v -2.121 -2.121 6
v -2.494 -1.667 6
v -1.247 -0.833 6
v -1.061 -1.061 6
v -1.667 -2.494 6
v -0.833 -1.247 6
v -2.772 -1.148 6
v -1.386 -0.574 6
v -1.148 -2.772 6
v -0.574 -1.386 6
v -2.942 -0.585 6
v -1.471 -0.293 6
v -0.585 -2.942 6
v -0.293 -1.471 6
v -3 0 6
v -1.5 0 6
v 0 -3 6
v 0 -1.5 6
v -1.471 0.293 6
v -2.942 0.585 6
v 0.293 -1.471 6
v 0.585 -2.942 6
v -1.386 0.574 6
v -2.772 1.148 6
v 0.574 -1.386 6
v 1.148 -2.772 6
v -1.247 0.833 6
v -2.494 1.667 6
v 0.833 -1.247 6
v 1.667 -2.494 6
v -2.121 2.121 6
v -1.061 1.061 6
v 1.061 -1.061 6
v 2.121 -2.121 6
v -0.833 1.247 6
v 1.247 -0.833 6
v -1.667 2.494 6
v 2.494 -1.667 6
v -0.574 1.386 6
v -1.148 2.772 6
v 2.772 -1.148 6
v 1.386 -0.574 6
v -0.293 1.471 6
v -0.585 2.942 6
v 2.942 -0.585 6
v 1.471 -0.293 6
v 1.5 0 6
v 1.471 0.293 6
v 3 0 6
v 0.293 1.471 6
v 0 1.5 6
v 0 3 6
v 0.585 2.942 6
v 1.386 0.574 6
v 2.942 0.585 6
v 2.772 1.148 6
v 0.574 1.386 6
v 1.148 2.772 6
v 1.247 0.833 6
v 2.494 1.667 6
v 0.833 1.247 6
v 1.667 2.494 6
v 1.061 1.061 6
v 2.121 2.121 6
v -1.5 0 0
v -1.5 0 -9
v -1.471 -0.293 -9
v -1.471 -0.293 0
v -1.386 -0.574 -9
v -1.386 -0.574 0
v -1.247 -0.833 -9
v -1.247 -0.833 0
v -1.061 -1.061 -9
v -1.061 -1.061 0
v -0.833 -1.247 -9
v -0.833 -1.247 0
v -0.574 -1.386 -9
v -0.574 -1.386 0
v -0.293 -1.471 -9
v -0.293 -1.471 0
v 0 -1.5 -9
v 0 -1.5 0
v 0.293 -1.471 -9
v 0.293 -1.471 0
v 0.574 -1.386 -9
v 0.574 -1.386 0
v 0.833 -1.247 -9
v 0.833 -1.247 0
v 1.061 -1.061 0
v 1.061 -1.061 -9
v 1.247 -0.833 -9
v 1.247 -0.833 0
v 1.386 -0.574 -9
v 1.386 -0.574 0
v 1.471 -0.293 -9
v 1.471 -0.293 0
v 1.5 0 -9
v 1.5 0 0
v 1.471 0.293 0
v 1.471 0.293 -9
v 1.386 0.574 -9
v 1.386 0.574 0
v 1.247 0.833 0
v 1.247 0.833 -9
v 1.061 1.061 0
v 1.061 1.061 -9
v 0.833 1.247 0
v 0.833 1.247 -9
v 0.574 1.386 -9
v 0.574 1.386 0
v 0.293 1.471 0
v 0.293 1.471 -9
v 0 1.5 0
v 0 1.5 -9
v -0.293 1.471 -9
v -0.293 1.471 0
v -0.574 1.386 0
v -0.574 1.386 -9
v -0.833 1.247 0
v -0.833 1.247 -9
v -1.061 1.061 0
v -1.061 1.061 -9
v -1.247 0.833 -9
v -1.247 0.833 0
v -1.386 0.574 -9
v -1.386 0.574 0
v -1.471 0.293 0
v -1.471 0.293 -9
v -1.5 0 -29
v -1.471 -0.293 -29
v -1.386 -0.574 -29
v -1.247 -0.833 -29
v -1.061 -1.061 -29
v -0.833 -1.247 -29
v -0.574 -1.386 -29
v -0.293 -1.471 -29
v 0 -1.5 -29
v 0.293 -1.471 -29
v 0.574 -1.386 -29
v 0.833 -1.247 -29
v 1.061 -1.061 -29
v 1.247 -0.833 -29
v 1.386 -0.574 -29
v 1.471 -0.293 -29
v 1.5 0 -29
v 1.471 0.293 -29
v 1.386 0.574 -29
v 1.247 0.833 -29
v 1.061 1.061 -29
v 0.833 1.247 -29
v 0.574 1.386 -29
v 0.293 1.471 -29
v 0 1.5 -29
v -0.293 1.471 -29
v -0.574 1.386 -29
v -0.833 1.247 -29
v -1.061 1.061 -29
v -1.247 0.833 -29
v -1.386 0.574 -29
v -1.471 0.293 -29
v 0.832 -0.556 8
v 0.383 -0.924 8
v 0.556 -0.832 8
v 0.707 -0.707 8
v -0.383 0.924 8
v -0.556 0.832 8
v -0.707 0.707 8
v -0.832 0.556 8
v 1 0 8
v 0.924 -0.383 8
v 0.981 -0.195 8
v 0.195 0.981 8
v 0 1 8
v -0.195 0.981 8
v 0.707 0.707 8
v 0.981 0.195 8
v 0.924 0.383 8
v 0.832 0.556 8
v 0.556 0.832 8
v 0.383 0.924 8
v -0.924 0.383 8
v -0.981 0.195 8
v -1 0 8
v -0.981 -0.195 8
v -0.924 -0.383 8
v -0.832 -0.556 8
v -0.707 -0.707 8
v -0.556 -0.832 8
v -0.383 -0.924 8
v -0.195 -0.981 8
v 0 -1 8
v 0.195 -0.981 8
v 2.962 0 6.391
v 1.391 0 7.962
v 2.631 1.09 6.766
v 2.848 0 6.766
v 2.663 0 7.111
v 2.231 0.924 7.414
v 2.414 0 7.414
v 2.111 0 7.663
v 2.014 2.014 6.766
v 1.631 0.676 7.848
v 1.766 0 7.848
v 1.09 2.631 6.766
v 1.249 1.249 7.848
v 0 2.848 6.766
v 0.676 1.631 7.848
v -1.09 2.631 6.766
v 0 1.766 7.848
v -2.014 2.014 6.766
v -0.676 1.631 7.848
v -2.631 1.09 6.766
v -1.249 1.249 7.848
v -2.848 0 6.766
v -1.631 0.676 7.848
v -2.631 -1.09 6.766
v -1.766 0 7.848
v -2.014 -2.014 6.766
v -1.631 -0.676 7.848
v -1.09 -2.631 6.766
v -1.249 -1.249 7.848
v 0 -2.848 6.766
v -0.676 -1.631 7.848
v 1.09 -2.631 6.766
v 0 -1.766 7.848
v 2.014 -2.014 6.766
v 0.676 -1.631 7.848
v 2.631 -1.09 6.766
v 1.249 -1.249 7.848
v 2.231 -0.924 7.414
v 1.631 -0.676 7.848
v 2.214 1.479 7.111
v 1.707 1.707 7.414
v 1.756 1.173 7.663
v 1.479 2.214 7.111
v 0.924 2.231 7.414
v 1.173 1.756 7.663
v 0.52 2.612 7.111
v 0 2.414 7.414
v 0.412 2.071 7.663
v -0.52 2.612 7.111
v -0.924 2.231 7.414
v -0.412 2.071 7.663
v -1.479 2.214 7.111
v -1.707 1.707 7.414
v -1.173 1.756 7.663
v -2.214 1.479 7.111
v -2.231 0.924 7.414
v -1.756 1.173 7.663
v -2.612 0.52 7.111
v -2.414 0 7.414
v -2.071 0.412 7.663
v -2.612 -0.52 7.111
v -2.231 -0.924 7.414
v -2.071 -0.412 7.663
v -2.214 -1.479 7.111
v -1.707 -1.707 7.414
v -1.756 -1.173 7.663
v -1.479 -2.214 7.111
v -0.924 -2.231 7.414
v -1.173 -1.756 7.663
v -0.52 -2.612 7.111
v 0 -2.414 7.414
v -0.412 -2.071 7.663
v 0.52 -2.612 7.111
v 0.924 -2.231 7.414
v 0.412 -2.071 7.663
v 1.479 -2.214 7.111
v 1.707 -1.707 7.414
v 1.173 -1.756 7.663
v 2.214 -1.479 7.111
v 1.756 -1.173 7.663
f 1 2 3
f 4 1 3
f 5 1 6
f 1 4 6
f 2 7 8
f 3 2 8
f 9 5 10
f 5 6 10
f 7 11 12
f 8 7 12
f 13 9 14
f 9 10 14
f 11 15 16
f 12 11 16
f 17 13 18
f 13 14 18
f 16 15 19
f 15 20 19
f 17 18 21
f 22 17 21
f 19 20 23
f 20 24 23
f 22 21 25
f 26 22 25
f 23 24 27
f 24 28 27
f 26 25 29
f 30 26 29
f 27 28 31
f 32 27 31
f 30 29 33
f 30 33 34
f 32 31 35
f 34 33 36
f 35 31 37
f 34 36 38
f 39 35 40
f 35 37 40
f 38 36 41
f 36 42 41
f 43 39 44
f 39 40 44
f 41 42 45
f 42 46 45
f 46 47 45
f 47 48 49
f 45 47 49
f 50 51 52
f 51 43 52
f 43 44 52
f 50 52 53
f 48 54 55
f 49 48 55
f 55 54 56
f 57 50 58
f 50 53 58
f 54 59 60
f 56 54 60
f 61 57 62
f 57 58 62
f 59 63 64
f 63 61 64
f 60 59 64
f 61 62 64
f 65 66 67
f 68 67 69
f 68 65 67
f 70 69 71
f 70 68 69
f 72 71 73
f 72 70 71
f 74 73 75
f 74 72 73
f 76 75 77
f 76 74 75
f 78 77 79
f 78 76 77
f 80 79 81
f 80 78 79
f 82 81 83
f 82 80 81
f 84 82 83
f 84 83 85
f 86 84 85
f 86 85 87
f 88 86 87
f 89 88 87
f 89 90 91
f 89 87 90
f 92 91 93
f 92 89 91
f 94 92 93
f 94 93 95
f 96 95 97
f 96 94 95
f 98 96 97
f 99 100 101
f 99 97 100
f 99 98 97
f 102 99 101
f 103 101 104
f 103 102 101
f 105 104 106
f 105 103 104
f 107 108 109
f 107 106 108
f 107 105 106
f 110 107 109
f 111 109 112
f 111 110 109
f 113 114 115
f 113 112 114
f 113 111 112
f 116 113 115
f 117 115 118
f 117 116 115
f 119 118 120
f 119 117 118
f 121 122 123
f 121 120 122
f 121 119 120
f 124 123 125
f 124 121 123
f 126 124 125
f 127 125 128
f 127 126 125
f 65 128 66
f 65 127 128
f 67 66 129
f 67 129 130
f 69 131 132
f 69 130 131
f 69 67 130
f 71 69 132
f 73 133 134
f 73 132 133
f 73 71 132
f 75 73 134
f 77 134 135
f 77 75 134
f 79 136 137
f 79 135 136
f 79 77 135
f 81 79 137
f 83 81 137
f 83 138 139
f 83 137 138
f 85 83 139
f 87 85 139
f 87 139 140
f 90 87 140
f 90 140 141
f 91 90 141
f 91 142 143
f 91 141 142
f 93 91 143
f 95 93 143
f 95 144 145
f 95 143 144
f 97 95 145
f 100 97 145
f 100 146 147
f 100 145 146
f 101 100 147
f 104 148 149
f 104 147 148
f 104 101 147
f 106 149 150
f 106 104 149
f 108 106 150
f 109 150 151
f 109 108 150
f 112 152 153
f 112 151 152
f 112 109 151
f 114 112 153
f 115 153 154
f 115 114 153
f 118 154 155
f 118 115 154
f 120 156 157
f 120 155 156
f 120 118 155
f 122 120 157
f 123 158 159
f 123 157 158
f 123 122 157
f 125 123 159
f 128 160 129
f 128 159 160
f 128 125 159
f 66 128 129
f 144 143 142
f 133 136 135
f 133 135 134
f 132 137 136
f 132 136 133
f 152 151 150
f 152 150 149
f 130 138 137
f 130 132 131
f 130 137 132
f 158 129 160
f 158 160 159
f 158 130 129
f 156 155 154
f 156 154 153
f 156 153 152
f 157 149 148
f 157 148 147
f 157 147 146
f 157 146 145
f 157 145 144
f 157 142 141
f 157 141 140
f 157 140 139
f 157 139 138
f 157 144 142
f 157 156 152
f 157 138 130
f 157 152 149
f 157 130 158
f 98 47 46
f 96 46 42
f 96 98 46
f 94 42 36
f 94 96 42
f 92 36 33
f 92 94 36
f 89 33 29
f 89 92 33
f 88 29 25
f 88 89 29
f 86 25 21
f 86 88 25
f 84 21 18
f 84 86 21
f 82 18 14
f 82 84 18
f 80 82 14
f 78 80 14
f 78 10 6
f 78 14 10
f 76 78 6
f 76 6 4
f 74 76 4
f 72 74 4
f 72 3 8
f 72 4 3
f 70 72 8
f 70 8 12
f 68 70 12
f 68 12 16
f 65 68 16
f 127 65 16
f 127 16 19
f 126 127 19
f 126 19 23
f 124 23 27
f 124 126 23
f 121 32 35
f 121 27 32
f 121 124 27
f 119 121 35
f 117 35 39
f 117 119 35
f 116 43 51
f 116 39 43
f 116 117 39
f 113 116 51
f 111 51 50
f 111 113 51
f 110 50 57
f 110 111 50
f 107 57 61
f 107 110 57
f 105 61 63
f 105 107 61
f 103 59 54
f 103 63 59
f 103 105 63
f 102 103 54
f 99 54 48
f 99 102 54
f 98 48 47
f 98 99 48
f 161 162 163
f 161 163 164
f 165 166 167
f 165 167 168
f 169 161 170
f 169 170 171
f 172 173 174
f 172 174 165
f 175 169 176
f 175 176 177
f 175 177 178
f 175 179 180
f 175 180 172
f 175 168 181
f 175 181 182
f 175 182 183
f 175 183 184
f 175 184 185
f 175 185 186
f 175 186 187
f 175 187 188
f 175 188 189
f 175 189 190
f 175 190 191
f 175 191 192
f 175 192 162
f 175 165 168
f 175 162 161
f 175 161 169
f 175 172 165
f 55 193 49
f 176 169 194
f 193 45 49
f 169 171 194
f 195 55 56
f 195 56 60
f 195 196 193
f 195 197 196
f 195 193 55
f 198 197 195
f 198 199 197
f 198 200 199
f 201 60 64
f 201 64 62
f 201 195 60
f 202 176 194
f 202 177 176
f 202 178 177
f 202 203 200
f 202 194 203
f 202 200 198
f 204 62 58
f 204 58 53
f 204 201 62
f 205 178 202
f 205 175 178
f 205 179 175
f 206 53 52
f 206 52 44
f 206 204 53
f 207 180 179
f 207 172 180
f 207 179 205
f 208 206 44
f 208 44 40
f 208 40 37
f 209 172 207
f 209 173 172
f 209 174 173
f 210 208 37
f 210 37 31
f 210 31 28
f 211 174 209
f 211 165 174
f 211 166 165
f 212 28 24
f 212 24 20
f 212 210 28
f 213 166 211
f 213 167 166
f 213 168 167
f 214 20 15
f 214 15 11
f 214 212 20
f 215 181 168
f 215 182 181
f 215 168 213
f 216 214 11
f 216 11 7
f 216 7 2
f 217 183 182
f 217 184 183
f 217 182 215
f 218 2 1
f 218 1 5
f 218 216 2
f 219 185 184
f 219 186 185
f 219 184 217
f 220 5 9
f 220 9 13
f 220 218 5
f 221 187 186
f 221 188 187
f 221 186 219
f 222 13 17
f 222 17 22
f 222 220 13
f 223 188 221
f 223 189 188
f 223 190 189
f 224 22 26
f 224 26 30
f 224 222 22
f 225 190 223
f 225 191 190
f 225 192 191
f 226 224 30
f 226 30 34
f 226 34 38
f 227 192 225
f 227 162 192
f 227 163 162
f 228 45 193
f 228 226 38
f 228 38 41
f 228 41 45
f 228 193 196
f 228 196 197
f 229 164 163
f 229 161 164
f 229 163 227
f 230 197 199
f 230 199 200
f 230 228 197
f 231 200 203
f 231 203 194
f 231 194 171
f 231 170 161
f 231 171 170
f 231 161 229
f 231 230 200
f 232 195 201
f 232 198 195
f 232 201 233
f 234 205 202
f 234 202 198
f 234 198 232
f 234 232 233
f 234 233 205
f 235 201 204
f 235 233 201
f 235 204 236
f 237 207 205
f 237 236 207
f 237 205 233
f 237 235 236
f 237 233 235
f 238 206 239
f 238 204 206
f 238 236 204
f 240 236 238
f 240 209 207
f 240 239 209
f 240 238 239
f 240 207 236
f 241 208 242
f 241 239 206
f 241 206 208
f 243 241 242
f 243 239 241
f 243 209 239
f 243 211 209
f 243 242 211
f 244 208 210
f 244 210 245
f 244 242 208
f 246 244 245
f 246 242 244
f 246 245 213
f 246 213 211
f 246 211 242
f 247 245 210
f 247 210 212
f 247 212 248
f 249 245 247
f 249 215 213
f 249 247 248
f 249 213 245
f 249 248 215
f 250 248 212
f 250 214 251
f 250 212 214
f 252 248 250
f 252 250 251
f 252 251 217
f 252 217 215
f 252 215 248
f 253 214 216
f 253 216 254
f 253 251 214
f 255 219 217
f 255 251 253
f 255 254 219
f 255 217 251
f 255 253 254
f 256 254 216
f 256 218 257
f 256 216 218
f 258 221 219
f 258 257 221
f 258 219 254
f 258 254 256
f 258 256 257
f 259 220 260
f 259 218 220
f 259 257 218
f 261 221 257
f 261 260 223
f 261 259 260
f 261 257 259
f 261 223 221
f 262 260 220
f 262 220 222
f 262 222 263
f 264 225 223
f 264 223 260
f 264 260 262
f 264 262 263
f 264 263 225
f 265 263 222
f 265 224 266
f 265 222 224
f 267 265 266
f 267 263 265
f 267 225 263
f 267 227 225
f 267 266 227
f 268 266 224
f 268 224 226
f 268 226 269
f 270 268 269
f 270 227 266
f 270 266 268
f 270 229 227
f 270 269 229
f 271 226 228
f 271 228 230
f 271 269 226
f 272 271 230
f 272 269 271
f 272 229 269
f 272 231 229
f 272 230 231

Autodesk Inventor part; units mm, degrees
ref_plane "YZ Plane" through (0, 0, 0) normal (1, 0, 0) x (0, 1, 0)
ref_plane "XZ Plane" through (0, 0, 0) normal (0, 1, 0) x (-1, 0, 0)
ref_plane "XY Plane" through (0, 0, 0) normal (0, 0, 1) x (1, 0, 0)
sketch "スケッチ1" plane through (0, 0, 0) normal (0, 0, 1) x (1, 0, 0)
  circle A0 centre (0, 0) radius 1.5
  dimension "d0" = 3
extrude "押し出し1" add sketch "スケッチ1" along normal blind 6
sketch "スケッチ2" plane through (0, 0, 6) normal (0, 0, 1) x (1, 0, 0)
  circle A0 centre (0, 0) radius 1.5 projected
  circle A1 centre (0, 0) radius 3
  dimension "d3" = 6
extrude "押し出し2" add sketch "スケッチ2" along normal blind 2 contours A0 | A1
fillet "フィレット1" radius 2 1 edges at (-3, 0, 8)
thread "ねじ1" size "M3x0.5" class "6g" standard "ANSI Metric M Profile" full length
sketch "スケッチ3" plane through (0, 0, 0) normal (0, 0, -1) x (-1, 0, 0)
  circle A0 centre (0, 0) radius 1.5 projected
extrude "押し出し3" add sketch "スケッチ3" along normal blind 9
sketch "スケッチ4" plane through (0, 0, -9) normal (0, 0, -1) x (-1, 0, 0)
  circle A0 centre (0, 0) radius 1.5 projected
extrude "押し出し4" add sketch "スケッチ4" along normal blind 20
properties part number "SB　35mmなべネジ" material "Steel, Mild"
